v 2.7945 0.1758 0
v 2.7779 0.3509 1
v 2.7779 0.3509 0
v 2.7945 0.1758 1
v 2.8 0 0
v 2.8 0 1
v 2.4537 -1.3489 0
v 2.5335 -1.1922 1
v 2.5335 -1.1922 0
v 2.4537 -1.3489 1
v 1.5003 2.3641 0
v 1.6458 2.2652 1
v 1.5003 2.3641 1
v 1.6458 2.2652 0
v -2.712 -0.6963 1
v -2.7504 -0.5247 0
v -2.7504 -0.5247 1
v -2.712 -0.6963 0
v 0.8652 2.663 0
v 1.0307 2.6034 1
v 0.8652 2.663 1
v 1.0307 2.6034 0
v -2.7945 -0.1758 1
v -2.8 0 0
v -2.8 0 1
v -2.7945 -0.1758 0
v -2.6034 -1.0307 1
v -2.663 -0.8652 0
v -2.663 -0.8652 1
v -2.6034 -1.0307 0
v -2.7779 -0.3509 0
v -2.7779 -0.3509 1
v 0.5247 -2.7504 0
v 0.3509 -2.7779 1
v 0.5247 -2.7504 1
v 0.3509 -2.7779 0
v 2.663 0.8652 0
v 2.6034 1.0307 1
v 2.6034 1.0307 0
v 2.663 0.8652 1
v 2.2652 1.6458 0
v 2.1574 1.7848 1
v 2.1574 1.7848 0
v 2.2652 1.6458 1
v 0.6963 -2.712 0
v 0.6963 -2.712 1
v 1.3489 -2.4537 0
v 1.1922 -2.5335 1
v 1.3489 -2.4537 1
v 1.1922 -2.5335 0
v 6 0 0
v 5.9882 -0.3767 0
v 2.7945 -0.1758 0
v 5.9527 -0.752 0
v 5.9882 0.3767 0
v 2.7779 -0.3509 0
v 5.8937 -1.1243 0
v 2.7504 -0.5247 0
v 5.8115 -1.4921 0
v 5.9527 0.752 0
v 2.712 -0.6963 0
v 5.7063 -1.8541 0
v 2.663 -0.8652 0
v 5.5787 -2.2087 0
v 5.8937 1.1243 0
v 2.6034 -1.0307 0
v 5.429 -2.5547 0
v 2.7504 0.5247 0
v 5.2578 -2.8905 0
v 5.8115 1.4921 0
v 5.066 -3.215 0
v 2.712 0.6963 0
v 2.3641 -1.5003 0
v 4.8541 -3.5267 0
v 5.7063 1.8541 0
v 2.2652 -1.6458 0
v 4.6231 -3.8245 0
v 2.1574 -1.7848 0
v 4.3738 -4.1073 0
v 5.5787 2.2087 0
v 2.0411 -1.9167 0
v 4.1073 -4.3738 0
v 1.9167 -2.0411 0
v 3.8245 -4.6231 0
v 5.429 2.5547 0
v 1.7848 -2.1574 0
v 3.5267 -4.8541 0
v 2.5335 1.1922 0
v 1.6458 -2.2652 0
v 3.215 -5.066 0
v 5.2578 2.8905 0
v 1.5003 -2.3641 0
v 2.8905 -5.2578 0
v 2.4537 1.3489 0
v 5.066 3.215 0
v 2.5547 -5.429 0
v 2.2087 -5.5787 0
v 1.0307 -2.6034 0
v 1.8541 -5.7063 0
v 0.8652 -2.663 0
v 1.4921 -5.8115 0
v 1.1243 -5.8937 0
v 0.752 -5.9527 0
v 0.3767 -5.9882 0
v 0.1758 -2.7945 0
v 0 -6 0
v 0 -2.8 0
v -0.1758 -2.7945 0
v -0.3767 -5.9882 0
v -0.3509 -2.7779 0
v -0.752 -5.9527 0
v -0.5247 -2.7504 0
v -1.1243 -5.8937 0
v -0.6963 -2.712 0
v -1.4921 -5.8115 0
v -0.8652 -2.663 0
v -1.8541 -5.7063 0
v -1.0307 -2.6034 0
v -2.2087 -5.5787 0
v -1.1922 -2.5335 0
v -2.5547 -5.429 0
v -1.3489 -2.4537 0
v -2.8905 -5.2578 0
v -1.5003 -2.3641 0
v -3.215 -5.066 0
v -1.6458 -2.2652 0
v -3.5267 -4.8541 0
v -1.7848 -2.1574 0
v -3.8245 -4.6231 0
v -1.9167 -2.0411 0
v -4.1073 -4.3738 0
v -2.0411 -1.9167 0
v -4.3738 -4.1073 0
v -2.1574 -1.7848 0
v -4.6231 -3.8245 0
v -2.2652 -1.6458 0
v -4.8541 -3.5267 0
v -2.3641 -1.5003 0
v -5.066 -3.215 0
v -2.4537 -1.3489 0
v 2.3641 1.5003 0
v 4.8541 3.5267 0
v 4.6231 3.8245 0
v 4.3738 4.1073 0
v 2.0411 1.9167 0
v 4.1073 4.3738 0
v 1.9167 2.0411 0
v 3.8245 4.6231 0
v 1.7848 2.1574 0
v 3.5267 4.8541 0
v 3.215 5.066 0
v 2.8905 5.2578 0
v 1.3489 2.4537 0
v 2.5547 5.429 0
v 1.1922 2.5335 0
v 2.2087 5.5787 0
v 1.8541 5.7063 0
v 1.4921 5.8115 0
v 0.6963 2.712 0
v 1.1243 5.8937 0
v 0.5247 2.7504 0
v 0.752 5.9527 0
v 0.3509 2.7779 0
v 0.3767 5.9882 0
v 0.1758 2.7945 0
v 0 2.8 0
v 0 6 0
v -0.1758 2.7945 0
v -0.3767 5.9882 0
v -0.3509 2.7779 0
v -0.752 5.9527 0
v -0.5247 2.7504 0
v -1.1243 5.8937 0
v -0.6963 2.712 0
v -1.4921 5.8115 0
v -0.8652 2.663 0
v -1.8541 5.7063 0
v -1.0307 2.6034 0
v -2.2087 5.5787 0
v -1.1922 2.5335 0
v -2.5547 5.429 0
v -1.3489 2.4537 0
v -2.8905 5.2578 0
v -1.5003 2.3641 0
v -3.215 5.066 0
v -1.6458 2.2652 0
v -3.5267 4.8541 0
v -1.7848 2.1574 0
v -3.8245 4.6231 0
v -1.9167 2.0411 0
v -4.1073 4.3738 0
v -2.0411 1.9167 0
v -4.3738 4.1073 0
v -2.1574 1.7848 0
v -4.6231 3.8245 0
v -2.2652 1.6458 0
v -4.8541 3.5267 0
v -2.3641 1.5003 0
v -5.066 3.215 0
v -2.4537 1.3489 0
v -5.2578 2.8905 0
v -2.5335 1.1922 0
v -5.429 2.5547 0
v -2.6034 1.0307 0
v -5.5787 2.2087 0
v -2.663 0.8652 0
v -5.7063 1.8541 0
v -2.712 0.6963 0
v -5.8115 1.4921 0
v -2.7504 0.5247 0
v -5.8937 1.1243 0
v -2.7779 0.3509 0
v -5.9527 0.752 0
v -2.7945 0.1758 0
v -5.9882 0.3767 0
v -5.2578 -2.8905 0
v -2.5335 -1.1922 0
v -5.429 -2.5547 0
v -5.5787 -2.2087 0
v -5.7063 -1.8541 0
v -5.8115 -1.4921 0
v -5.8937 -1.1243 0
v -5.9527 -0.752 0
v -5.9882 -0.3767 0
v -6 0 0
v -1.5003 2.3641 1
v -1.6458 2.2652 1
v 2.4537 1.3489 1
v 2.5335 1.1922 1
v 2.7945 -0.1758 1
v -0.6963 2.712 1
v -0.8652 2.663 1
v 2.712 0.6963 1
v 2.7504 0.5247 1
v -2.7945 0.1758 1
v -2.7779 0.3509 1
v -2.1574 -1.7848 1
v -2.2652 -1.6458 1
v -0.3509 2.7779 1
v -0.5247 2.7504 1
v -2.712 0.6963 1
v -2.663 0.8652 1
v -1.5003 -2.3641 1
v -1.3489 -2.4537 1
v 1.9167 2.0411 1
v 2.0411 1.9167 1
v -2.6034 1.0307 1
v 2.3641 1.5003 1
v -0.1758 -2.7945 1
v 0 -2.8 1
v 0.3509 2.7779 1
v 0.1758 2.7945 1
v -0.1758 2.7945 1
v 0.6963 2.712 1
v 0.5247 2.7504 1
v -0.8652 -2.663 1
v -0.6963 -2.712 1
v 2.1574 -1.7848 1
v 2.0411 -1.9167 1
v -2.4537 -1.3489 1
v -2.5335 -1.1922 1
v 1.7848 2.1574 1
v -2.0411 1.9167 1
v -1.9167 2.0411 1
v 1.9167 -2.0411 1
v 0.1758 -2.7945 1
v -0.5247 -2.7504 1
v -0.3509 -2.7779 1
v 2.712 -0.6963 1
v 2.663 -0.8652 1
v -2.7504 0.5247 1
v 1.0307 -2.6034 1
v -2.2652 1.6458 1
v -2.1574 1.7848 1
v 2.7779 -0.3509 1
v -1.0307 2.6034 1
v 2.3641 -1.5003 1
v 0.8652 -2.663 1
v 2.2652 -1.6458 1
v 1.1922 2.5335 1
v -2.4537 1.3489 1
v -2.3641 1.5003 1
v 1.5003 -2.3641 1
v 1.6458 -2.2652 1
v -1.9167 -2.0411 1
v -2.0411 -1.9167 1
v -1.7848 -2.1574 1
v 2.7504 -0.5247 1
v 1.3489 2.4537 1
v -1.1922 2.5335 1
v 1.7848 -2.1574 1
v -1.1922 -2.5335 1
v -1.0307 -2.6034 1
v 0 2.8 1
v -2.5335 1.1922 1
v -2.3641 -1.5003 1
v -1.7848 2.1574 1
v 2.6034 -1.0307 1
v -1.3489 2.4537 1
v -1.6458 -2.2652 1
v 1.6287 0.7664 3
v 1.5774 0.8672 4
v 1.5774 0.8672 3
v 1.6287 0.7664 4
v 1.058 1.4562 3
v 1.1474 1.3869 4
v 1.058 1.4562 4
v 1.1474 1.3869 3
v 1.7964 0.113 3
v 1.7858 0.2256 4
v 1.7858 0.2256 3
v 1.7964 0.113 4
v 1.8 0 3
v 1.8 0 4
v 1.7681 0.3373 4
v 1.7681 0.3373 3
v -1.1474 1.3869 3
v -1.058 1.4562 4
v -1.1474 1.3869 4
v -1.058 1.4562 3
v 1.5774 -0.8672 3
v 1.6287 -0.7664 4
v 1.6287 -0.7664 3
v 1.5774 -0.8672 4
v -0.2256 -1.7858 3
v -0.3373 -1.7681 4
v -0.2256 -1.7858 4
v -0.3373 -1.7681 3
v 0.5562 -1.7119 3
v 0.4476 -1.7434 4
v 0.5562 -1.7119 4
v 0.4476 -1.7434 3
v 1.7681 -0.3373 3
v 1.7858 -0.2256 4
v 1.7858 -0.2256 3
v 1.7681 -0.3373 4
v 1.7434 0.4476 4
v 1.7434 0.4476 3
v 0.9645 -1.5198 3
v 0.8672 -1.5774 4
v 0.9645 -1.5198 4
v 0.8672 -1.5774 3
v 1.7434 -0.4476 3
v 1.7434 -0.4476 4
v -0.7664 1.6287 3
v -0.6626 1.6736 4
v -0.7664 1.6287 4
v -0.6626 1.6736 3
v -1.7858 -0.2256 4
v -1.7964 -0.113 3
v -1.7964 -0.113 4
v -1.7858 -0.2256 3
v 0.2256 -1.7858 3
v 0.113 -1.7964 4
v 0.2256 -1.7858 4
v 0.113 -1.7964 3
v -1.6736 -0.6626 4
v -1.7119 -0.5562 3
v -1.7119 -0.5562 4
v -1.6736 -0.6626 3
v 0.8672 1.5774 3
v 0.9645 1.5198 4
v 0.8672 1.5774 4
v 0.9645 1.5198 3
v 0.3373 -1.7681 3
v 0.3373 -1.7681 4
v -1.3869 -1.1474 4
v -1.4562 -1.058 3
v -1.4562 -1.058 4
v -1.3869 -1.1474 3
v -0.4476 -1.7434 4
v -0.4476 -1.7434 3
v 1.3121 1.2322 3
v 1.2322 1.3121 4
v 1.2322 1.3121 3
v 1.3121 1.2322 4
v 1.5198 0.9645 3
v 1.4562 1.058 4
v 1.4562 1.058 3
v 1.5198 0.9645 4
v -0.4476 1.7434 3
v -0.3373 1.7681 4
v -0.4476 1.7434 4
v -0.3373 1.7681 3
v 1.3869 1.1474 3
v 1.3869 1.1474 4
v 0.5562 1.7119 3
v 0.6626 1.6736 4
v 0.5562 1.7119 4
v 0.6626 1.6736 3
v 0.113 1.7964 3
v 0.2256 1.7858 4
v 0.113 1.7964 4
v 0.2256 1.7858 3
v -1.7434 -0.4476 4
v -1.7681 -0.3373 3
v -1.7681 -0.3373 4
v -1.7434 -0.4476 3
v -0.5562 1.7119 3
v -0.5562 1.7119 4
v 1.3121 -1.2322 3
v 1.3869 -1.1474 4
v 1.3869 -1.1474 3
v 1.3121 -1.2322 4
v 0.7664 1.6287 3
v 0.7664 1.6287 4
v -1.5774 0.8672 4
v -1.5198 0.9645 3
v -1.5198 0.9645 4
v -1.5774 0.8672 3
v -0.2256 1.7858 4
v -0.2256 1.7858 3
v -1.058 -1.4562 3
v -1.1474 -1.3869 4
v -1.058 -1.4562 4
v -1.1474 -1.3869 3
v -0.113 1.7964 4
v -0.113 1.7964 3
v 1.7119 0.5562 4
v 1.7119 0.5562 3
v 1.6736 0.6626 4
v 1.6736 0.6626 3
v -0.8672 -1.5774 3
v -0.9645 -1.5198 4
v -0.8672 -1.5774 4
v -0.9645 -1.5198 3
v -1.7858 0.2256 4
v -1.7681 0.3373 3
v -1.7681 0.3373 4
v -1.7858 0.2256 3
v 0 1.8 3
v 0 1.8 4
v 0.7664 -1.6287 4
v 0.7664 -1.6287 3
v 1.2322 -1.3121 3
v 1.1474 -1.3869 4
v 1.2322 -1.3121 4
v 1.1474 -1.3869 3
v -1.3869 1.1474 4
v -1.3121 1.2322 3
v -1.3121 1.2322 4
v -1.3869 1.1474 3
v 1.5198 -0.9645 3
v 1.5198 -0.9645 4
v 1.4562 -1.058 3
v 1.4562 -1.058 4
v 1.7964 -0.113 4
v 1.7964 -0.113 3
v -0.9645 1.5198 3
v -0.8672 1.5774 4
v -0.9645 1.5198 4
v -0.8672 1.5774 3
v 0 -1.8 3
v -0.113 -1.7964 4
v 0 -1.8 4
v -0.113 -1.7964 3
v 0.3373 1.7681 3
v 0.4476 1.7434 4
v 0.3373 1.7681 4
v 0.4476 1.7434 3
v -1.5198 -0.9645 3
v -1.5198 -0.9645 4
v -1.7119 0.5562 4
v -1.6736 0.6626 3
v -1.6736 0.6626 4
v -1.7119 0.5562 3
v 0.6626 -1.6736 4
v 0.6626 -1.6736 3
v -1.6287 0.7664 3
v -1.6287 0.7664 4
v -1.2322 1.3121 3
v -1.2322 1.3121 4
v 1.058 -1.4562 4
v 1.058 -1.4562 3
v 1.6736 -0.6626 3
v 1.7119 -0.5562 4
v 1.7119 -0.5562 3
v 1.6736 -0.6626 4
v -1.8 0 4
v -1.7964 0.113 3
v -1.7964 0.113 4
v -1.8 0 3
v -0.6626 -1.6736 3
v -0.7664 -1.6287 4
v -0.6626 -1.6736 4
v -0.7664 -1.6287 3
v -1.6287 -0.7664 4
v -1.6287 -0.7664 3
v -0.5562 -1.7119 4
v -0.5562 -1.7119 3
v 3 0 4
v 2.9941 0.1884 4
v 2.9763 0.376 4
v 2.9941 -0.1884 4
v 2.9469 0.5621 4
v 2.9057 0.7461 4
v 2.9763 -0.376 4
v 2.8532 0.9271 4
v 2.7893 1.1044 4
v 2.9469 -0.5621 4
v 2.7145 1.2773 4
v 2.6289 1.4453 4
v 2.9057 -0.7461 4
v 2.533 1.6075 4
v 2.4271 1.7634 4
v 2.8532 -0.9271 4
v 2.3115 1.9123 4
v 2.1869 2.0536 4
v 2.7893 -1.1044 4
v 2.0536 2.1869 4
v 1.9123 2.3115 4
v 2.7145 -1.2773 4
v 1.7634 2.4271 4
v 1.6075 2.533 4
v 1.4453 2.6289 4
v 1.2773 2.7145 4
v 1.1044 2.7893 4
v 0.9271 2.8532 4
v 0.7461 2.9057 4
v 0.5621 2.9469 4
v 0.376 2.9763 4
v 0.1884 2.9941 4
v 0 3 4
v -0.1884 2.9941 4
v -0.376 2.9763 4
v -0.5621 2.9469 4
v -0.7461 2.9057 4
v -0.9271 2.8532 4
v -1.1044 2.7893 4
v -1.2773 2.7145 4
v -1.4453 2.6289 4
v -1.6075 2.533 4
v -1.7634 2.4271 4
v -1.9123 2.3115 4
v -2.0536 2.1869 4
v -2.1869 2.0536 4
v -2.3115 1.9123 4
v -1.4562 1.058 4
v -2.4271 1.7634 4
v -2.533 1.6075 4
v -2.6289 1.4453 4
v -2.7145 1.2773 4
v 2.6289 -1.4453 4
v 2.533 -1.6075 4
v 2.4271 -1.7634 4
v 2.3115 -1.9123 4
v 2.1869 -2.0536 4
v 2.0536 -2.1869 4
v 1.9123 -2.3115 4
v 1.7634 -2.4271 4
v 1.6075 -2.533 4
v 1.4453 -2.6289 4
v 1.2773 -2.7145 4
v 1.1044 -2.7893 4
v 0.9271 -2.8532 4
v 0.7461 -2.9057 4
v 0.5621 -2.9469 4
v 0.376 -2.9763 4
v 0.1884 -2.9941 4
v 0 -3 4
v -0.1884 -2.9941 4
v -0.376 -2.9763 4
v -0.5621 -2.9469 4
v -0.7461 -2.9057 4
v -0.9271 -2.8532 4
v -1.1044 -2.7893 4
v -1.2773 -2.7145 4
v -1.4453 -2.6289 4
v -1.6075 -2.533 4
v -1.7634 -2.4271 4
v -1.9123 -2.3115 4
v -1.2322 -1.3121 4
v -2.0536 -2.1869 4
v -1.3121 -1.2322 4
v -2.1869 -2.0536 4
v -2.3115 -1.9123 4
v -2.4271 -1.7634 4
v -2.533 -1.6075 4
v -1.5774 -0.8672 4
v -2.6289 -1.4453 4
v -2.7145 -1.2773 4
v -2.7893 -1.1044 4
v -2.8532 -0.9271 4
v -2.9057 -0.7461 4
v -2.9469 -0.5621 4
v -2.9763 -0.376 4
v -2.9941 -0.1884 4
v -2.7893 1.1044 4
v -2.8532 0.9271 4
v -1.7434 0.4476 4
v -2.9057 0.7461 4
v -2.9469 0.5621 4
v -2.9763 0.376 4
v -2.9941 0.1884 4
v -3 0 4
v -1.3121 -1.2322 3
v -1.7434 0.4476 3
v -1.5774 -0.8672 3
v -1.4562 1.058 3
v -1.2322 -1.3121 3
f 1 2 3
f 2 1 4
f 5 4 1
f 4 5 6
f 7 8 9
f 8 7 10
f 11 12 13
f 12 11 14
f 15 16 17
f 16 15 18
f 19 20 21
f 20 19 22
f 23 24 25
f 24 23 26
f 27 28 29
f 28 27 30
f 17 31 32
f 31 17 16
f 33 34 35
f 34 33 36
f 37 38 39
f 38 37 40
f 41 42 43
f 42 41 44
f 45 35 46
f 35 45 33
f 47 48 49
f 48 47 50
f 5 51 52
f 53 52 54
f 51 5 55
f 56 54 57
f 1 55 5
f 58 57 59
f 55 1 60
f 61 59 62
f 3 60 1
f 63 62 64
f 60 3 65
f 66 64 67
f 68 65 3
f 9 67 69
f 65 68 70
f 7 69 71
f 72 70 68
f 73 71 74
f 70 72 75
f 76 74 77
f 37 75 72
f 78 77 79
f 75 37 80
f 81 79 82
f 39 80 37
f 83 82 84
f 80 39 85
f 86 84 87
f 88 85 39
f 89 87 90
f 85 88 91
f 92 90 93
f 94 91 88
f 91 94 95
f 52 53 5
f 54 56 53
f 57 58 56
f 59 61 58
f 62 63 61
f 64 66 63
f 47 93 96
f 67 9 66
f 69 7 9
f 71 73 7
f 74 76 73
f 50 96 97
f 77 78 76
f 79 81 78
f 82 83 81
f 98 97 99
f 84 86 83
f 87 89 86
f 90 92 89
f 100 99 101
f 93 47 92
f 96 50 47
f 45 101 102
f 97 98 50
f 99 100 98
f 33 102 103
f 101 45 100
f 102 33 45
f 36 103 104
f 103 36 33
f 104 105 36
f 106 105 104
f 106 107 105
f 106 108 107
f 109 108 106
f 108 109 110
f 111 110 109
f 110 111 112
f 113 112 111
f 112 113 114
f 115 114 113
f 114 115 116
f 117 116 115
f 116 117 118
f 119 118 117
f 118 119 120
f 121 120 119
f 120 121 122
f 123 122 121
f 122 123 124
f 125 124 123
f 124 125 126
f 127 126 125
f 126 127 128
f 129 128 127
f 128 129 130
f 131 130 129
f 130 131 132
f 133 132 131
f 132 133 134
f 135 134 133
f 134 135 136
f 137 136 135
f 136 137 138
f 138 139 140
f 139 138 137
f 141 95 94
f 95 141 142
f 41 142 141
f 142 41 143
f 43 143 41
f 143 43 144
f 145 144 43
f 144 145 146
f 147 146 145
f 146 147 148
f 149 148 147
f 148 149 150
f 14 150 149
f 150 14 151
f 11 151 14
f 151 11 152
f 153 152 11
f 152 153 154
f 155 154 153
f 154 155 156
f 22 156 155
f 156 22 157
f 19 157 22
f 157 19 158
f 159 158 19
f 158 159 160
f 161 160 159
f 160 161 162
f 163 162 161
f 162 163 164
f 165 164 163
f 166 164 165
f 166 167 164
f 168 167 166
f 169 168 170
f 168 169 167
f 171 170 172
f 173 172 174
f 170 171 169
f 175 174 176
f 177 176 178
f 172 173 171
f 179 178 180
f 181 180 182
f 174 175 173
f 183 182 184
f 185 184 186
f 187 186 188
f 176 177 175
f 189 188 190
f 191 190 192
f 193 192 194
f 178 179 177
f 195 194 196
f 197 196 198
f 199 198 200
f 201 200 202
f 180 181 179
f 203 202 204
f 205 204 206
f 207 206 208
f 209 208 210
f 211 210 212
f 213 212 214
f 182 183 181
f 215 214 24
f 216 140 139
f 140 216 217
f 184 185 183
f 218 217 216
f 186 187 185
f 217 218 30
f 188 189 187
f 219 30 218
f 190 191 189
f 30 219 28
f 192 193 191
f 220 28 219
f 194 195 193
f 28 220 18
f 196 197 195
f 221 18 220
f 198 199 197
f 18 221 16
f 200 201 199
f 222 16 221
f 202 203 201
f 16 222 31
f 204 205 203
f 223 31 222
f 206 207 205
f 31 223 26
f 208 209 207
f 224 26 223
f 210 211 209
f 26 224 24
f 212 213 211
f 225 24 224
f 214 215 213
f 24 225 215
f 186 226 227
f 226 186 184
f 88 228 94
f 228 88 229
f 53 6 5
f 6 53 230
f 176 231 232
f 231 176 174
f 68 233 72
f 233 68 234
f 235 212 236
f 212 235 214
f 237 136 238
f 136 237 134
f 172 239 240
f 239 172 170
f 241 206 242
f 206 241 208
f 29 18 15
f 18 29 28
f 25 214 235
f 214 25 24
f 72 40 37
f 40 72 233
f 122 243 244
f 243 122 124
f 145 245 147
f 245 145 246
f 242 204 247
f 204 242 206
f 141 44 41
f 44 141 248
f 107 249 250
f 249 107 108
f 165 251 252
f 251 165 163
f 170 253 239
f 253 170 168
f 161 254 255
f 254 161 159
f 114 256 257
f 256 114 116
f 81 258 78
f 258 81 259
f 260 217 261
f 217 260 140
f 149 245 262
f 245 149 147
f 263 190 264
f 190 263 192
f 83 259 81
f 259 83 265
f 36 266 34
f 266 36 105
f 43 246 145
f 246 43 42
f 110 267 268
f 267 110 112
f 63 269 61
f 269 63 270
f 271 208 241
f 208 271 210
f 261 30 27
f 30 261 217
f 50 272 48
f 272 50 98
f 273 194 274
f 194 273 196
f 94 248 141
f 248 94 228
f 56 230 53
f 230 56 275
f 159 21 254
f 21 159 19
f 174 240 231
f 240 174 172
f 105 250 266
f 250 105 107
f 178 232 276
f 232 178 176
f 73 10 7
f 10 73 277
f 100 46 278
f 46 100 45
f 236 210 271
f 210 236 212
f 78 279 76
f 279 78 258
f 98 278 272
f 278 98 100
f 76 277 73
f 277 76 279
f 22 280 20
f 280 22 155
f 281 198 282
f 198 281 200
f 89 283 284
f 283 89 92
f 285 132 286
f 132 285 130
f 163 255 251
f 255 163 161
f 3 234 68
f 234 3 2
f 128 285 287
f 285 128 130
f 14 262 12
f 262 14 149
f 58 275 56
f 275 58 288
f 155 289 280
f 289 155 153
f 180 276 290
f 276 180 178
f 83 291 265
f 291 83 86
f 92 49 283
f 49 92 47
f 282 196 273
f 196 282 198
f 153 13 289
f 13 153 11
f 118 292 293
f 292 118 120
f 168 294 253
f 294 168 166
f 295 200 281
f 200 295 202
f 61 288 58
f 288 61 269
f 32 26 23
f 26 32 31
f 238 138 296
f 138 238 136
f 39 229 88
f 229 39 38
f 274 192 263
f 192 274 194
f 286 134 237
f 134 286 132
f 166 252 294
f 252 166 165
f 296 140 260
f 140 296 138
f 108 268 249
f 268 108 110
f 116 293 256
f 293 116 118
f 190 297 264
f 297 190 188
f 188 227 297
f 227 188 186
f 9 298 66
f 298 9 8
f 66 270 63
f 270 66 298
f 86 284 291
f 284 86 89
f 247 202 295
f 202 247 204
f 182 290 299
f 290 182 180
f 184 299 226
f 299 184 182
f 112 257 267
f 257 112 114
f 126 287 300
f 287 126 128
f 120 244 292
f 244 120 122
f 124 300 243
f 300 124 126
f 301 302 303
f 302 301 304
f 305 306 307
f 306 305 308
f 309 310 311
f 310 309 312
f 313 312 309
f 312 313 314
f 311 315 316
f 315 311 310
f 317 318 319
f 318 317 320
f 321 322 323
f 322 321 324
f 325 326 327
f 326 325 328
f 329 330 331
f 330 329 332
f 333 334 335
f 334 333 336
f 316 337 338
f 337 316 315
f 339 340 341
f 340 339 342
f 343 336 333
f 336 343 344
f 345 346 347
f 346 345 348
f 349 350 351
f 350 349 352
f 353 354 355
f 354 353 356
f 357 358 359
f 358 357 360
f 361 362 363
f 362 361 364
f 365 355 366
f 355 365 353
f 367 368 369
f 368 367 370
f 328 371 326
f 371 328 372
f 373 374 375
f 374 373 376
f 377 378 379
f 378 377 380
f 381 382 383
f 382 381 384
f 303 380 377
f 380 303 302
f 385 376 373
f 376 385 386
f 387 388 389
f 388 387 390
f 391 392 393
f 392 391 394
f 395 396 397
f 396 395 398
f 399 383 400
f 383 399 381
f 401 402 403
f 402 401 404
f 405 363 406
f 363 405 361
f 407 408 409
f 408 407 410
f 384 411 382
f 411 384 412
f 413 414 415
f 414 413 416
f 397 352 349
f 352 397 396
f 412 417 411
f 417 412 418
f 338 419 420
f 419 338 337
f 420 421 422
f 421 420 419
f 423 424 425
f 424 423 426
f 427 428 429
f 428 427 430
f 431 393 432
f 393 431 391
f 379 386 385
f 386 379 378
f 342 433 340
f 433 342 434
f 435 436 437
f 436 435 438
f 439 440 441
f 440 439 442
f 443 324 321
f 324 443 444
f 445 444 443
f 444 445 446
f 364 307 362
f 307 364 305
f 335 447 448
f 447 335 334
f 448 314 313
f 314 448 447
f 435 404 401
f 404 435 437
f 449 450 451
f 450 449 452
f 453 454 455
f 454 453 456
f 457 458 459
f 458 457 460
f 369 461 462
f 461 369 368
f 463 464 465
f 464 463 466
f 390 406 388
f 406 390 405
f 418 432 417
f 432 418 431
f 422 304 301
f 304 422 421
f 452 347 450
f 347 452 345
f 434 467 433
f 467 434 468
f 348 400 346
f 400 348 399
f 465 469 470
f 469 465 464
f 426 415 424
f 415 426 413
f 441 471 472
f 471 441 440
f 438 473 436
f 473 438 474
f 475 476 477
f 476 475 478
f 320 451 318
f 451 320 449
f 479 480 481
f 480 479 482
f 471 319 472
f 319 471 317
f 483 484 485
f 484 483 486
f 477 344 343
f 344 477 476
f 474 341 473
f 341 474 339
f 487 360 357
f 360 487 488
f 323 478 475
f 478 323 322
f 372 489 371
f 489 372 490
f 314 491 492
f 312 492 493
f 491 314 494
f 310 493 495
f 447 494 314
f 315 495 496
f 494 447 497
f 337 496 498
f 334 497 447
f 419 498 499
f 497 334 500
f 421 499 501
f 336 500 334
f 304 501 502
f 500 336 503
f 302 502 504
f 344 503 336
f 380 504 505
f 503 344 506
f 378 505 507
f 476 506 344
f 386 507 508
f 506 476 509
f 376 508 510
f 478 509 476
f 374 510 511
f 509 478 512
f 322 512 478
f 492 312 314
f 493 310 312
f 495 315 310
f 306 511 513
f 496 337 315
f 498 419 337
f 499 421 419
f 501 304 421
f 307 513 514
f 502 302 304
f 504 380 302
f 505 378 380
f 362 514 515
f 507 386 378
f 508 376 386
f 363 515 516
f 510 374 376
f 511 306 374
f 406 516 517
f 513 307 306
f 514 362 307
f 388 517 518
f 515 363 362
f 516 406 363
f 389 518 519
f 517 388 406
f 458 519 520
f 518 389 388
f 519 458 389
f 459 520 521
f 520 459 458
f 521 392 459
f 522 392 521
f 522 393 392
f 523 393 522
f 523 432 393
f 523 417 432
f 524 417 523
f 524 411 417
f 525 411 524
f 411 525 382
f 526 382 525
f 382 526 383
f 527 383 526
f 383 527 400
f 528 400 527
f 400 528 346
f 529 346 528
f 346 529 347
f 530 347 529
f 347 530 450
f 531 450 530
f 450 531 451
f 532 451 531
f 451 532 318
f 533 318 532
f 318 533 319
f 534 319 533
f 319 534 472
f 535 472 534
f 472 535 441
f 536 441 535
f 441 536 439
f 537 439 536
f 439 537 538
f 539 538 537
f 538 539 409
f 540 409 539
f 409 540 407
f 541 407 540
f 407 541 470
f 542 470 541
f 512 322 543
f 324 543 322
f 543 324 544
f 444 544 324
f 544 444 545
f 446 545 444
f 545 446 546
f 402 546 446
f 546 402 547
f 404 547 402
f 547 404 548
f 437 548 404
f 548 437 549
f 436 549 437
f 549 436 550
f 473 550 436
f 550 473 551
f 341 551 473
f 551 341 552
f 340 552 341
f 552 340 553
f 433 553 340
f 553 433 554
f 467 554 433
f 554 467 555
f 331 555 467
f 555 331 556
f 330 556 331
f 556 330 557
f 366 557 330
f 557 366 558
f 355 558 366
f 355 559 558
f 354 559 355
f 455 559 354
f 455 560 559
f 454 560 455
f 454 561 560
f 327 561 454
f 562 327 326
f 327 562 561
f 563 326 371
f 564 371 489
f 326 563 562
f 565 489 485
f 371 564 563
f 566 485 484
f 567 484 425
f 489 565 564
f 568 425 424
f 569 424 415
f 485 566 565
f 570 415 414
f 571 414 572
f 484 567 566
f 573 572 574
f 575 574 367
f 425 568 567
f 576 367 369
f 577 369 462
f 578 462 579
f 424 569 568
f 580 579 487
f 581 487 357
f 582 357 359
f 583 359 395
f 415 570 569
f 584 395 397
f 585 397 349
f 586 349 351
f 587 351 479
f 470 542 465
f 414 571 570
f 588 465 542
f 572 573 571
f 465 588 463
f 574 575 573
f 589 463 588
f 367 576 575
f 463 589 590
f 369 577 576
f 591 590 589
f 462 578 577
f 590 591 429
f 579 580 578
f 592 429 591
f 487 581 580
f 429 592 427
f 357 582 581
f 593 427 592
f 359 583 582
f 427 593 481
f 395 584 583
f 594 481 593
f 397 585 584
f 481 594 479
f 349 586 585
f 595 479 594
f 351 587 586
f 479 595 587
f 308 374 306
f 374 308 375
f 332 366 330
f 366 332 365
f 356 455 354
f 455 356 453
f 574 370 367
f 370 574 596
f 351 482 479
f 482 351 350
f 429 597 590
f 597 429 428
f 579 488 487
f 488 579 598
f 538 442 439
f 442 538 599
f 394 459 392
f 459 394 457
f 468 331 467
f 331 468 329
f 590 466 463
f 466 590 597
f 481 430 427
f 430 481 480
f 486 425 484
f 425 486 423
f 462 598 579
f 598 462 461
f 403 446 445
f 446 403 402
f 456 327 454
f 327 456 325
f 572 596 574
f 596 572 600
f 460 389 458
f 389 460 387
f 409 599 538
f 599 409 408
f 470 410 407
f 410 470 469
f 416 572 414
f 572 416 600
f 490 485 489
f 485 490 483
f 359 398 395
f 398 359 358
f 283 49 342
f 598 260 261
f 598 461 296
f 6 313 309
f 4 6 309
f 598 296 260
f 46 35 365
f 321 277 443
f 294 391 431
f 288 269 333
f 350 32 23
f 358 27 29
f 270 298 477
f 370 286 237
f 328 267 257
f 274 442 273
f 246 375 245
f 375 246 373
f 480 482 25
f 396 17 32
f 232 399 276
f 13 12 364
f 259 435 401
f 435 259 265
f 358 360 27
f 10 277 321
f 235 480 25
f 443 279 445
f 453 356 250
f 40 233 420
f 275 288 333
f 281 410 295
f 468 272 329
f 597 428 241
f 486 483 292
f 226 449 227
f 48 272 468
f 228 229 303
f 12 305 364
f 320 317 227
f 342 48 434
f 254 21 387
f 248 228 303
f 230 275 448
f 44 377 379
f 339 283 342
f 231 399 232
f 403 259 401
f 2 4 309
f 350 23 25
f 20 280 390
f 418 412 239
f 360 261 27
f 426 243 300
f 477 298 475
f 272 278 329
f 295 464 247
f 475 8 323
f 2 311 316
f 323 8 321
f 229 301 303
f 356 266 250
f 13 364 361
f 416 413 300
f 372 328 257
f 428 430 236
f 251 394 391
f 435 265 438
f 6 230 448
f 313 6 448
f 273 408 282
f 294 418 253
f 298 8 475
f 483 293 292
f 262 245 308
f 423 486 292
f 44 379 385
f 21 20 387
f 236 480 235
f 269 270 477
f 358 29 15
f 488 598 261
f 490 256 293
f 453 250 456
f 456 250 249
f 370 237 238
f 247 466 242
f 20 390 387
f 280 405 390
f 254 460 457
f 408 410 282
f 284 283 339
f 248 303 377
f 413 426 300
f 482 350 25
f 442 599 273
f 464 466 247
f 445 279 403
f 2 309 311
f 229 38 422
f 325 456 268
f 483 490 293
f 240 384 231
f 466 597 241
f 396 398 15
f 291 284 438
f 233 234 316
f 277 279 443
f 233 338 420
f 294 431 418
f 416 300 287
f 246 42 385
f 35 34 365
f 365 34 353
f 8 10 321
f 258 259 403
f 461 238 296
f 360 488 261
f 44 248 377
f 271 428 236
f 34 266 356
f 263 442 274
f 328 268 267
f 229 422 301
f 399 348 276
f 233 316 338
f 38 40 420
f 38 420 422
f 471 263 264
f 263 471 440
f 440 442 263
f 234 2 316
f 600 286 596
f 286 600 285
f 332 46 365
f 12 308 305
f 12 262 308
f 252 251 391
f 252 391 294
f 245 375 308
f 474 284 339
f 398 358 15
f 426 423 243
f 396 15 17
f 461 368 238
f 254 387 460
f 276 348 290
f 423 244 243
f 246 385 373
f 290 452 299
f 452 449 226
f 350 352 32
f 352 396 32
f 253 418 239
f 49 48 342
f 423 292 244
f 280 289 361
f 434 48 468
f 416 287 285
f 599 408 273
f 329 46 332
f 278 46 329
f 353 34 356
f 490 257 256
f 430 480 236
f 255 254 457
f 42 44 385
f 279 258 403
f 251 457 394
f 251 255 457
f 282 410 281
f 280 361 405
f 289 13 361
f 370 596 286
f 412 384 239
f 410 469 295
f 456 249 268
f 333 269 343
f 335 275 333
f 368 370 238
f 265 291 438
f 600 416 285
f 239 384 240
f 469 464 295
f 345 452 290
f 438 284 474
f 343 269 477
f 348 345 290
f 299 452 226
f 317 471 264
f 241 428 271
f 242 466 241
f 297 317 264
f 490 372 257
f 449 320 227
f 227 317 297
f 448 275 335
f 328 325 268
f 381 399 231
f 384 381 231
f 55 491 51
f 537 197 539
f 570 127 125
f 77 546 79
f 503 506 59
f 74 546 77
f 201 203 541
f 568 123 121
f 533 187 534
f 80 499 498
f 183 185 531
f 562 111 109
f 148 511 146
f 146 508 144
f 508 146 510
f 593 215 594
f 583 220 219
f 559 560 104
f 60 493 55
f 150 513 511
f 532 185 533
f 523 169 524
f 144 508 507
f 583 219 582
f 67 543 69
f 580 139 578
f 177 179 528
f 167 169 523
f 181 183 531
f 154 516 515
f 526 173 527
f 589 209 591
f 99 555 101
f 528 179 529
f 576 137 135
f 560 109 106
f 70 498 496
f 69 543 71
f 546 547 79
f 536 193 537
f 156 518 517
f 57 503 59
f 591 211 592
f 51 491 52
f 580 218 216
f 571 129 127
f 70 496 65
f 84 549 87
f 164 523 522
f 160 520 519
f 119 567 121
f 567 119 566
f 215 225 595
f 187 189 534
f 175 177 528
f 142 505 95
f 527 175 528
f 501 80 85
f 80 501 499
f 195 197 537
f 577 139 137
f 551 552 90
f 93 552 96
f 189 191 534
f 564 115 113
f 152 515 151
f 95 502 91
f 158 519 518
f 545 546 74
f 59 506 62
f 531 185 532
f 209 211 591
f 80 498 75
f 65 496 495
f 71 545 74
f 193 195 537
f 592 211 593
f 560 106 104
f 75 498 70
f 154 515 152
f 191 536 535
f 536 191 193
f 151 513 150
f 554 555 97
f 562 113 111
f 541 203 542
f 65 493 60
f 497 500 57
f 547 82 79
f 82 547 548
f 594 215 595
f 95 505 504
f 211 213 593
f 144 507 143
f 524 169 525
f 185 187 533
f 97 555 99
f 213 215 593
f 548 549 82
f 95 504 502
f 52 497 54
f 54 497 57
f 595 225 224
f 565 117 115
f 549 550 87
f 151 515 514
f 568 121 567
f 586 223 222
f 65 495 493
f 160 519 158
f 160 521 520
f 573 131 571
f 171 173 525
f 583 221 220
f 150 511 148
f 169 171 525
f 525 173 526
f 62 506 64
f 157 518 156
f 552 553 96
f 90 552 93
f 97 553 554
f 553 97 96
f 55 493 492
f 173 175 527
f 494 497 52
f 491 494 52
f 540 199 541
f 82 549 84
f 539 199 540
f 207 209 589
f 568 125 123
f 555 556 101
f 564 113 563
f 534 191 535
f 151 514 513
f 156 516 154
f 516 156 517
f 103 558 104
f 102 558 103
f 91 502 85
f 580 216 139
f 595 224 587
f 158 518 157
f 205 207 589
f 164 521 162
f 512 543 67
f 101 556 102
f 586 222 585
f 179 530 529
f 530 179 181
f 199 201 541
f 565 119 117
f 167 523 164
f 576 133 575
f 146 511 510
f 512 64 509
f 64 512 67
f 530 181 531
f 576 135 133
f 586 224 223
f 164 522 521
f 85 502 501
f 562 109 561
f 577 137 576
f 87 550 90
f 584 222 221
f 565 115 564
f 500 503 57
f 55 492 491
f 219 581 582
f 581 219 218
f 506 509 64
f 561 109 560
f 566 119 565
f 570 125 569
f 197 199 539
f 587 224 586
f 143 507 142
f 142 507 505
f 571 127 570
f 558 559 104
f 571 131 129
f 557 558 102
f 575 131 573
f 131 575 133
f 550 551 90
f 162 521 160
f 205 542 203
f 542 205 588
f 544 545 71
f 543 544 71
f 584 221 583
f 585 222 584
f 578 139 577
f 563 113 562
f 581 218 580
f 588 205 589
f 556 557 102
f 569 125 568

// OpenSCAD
// Input the Inner Diameter of the "narrow" end
upper_inner_diameter = 3;

// Input the Outer Diameter of the "narrow" end
upper_outer_diameter = 6;

// Input the Inner Diameter of the "wide" end
lower_inner_diameter = 5;

// Input the Outer Diameter of the "wide" end
lower_outer_diameter = 12;

// Input the Height of the "inner" countersink
inner_height = 2;

// Input the Height of the "outer" countersink
outer_height = 4;

// Input the Tolerance of the printer
tolerance = .3;

// Select the Position of the "inner" countersink
inner_pos = "center";//[bottom,top,center]

difference()
{
    $fn = 100;
    
    upper_inner_diameter=upper_inner_diameter+(2*tolerance);
    //upper_outer_diameter=upper_outer_diameter-(2*tolerance);
    lower_inner_diameter=lower_inner_diameter+(2*tolerance);
    //lower_outer_diameter=lower_outer_diameter-(2*tolerance);
    
    cylinder(r1=lower_outer_diameter/2, r2=upper_outer_diameter/2, h=outer_height);
    
    if(inner_pos=="center")
    {
        cylinder(r=lower_inner_diameter/2, h=(outer_height/2)-(inner_height/2));
        translate([0,0,outer_height/2])
        cylinder(r=upper_inner_diameter/2, h=outer_height/2);
        translate([0,0,(outer_height/2)-(inner_height/2)])
        cylinder(r1=lower_inner_diameter/2, r2=upper_inner_diameter/2, h=inner_height);
    }
    else if(inner_pos=="top")
    {
        cylinder(r=upper_inner_diameter/2, h=outer_height);
        cylinder(r1=lower_inner_diameter/2, r2=upper_inner_diameter/2, h=inner_height);
    }
    else
    {
        cylinder(r=lower_inner_diameter/2, h=outer_height-inner_height);
        translate([0,0,outer_height-inner_height])
        cylinder(r1=upper_inner_diameter/2, r2=upper_inner_diameter/2, h=inner_height);
        translate([0,0,outer_height-inner_height])
         cylinder(r1=lower_inner_diameter/2, r2=upper_inner_diameter/2, h=inner_height);
    }
}
